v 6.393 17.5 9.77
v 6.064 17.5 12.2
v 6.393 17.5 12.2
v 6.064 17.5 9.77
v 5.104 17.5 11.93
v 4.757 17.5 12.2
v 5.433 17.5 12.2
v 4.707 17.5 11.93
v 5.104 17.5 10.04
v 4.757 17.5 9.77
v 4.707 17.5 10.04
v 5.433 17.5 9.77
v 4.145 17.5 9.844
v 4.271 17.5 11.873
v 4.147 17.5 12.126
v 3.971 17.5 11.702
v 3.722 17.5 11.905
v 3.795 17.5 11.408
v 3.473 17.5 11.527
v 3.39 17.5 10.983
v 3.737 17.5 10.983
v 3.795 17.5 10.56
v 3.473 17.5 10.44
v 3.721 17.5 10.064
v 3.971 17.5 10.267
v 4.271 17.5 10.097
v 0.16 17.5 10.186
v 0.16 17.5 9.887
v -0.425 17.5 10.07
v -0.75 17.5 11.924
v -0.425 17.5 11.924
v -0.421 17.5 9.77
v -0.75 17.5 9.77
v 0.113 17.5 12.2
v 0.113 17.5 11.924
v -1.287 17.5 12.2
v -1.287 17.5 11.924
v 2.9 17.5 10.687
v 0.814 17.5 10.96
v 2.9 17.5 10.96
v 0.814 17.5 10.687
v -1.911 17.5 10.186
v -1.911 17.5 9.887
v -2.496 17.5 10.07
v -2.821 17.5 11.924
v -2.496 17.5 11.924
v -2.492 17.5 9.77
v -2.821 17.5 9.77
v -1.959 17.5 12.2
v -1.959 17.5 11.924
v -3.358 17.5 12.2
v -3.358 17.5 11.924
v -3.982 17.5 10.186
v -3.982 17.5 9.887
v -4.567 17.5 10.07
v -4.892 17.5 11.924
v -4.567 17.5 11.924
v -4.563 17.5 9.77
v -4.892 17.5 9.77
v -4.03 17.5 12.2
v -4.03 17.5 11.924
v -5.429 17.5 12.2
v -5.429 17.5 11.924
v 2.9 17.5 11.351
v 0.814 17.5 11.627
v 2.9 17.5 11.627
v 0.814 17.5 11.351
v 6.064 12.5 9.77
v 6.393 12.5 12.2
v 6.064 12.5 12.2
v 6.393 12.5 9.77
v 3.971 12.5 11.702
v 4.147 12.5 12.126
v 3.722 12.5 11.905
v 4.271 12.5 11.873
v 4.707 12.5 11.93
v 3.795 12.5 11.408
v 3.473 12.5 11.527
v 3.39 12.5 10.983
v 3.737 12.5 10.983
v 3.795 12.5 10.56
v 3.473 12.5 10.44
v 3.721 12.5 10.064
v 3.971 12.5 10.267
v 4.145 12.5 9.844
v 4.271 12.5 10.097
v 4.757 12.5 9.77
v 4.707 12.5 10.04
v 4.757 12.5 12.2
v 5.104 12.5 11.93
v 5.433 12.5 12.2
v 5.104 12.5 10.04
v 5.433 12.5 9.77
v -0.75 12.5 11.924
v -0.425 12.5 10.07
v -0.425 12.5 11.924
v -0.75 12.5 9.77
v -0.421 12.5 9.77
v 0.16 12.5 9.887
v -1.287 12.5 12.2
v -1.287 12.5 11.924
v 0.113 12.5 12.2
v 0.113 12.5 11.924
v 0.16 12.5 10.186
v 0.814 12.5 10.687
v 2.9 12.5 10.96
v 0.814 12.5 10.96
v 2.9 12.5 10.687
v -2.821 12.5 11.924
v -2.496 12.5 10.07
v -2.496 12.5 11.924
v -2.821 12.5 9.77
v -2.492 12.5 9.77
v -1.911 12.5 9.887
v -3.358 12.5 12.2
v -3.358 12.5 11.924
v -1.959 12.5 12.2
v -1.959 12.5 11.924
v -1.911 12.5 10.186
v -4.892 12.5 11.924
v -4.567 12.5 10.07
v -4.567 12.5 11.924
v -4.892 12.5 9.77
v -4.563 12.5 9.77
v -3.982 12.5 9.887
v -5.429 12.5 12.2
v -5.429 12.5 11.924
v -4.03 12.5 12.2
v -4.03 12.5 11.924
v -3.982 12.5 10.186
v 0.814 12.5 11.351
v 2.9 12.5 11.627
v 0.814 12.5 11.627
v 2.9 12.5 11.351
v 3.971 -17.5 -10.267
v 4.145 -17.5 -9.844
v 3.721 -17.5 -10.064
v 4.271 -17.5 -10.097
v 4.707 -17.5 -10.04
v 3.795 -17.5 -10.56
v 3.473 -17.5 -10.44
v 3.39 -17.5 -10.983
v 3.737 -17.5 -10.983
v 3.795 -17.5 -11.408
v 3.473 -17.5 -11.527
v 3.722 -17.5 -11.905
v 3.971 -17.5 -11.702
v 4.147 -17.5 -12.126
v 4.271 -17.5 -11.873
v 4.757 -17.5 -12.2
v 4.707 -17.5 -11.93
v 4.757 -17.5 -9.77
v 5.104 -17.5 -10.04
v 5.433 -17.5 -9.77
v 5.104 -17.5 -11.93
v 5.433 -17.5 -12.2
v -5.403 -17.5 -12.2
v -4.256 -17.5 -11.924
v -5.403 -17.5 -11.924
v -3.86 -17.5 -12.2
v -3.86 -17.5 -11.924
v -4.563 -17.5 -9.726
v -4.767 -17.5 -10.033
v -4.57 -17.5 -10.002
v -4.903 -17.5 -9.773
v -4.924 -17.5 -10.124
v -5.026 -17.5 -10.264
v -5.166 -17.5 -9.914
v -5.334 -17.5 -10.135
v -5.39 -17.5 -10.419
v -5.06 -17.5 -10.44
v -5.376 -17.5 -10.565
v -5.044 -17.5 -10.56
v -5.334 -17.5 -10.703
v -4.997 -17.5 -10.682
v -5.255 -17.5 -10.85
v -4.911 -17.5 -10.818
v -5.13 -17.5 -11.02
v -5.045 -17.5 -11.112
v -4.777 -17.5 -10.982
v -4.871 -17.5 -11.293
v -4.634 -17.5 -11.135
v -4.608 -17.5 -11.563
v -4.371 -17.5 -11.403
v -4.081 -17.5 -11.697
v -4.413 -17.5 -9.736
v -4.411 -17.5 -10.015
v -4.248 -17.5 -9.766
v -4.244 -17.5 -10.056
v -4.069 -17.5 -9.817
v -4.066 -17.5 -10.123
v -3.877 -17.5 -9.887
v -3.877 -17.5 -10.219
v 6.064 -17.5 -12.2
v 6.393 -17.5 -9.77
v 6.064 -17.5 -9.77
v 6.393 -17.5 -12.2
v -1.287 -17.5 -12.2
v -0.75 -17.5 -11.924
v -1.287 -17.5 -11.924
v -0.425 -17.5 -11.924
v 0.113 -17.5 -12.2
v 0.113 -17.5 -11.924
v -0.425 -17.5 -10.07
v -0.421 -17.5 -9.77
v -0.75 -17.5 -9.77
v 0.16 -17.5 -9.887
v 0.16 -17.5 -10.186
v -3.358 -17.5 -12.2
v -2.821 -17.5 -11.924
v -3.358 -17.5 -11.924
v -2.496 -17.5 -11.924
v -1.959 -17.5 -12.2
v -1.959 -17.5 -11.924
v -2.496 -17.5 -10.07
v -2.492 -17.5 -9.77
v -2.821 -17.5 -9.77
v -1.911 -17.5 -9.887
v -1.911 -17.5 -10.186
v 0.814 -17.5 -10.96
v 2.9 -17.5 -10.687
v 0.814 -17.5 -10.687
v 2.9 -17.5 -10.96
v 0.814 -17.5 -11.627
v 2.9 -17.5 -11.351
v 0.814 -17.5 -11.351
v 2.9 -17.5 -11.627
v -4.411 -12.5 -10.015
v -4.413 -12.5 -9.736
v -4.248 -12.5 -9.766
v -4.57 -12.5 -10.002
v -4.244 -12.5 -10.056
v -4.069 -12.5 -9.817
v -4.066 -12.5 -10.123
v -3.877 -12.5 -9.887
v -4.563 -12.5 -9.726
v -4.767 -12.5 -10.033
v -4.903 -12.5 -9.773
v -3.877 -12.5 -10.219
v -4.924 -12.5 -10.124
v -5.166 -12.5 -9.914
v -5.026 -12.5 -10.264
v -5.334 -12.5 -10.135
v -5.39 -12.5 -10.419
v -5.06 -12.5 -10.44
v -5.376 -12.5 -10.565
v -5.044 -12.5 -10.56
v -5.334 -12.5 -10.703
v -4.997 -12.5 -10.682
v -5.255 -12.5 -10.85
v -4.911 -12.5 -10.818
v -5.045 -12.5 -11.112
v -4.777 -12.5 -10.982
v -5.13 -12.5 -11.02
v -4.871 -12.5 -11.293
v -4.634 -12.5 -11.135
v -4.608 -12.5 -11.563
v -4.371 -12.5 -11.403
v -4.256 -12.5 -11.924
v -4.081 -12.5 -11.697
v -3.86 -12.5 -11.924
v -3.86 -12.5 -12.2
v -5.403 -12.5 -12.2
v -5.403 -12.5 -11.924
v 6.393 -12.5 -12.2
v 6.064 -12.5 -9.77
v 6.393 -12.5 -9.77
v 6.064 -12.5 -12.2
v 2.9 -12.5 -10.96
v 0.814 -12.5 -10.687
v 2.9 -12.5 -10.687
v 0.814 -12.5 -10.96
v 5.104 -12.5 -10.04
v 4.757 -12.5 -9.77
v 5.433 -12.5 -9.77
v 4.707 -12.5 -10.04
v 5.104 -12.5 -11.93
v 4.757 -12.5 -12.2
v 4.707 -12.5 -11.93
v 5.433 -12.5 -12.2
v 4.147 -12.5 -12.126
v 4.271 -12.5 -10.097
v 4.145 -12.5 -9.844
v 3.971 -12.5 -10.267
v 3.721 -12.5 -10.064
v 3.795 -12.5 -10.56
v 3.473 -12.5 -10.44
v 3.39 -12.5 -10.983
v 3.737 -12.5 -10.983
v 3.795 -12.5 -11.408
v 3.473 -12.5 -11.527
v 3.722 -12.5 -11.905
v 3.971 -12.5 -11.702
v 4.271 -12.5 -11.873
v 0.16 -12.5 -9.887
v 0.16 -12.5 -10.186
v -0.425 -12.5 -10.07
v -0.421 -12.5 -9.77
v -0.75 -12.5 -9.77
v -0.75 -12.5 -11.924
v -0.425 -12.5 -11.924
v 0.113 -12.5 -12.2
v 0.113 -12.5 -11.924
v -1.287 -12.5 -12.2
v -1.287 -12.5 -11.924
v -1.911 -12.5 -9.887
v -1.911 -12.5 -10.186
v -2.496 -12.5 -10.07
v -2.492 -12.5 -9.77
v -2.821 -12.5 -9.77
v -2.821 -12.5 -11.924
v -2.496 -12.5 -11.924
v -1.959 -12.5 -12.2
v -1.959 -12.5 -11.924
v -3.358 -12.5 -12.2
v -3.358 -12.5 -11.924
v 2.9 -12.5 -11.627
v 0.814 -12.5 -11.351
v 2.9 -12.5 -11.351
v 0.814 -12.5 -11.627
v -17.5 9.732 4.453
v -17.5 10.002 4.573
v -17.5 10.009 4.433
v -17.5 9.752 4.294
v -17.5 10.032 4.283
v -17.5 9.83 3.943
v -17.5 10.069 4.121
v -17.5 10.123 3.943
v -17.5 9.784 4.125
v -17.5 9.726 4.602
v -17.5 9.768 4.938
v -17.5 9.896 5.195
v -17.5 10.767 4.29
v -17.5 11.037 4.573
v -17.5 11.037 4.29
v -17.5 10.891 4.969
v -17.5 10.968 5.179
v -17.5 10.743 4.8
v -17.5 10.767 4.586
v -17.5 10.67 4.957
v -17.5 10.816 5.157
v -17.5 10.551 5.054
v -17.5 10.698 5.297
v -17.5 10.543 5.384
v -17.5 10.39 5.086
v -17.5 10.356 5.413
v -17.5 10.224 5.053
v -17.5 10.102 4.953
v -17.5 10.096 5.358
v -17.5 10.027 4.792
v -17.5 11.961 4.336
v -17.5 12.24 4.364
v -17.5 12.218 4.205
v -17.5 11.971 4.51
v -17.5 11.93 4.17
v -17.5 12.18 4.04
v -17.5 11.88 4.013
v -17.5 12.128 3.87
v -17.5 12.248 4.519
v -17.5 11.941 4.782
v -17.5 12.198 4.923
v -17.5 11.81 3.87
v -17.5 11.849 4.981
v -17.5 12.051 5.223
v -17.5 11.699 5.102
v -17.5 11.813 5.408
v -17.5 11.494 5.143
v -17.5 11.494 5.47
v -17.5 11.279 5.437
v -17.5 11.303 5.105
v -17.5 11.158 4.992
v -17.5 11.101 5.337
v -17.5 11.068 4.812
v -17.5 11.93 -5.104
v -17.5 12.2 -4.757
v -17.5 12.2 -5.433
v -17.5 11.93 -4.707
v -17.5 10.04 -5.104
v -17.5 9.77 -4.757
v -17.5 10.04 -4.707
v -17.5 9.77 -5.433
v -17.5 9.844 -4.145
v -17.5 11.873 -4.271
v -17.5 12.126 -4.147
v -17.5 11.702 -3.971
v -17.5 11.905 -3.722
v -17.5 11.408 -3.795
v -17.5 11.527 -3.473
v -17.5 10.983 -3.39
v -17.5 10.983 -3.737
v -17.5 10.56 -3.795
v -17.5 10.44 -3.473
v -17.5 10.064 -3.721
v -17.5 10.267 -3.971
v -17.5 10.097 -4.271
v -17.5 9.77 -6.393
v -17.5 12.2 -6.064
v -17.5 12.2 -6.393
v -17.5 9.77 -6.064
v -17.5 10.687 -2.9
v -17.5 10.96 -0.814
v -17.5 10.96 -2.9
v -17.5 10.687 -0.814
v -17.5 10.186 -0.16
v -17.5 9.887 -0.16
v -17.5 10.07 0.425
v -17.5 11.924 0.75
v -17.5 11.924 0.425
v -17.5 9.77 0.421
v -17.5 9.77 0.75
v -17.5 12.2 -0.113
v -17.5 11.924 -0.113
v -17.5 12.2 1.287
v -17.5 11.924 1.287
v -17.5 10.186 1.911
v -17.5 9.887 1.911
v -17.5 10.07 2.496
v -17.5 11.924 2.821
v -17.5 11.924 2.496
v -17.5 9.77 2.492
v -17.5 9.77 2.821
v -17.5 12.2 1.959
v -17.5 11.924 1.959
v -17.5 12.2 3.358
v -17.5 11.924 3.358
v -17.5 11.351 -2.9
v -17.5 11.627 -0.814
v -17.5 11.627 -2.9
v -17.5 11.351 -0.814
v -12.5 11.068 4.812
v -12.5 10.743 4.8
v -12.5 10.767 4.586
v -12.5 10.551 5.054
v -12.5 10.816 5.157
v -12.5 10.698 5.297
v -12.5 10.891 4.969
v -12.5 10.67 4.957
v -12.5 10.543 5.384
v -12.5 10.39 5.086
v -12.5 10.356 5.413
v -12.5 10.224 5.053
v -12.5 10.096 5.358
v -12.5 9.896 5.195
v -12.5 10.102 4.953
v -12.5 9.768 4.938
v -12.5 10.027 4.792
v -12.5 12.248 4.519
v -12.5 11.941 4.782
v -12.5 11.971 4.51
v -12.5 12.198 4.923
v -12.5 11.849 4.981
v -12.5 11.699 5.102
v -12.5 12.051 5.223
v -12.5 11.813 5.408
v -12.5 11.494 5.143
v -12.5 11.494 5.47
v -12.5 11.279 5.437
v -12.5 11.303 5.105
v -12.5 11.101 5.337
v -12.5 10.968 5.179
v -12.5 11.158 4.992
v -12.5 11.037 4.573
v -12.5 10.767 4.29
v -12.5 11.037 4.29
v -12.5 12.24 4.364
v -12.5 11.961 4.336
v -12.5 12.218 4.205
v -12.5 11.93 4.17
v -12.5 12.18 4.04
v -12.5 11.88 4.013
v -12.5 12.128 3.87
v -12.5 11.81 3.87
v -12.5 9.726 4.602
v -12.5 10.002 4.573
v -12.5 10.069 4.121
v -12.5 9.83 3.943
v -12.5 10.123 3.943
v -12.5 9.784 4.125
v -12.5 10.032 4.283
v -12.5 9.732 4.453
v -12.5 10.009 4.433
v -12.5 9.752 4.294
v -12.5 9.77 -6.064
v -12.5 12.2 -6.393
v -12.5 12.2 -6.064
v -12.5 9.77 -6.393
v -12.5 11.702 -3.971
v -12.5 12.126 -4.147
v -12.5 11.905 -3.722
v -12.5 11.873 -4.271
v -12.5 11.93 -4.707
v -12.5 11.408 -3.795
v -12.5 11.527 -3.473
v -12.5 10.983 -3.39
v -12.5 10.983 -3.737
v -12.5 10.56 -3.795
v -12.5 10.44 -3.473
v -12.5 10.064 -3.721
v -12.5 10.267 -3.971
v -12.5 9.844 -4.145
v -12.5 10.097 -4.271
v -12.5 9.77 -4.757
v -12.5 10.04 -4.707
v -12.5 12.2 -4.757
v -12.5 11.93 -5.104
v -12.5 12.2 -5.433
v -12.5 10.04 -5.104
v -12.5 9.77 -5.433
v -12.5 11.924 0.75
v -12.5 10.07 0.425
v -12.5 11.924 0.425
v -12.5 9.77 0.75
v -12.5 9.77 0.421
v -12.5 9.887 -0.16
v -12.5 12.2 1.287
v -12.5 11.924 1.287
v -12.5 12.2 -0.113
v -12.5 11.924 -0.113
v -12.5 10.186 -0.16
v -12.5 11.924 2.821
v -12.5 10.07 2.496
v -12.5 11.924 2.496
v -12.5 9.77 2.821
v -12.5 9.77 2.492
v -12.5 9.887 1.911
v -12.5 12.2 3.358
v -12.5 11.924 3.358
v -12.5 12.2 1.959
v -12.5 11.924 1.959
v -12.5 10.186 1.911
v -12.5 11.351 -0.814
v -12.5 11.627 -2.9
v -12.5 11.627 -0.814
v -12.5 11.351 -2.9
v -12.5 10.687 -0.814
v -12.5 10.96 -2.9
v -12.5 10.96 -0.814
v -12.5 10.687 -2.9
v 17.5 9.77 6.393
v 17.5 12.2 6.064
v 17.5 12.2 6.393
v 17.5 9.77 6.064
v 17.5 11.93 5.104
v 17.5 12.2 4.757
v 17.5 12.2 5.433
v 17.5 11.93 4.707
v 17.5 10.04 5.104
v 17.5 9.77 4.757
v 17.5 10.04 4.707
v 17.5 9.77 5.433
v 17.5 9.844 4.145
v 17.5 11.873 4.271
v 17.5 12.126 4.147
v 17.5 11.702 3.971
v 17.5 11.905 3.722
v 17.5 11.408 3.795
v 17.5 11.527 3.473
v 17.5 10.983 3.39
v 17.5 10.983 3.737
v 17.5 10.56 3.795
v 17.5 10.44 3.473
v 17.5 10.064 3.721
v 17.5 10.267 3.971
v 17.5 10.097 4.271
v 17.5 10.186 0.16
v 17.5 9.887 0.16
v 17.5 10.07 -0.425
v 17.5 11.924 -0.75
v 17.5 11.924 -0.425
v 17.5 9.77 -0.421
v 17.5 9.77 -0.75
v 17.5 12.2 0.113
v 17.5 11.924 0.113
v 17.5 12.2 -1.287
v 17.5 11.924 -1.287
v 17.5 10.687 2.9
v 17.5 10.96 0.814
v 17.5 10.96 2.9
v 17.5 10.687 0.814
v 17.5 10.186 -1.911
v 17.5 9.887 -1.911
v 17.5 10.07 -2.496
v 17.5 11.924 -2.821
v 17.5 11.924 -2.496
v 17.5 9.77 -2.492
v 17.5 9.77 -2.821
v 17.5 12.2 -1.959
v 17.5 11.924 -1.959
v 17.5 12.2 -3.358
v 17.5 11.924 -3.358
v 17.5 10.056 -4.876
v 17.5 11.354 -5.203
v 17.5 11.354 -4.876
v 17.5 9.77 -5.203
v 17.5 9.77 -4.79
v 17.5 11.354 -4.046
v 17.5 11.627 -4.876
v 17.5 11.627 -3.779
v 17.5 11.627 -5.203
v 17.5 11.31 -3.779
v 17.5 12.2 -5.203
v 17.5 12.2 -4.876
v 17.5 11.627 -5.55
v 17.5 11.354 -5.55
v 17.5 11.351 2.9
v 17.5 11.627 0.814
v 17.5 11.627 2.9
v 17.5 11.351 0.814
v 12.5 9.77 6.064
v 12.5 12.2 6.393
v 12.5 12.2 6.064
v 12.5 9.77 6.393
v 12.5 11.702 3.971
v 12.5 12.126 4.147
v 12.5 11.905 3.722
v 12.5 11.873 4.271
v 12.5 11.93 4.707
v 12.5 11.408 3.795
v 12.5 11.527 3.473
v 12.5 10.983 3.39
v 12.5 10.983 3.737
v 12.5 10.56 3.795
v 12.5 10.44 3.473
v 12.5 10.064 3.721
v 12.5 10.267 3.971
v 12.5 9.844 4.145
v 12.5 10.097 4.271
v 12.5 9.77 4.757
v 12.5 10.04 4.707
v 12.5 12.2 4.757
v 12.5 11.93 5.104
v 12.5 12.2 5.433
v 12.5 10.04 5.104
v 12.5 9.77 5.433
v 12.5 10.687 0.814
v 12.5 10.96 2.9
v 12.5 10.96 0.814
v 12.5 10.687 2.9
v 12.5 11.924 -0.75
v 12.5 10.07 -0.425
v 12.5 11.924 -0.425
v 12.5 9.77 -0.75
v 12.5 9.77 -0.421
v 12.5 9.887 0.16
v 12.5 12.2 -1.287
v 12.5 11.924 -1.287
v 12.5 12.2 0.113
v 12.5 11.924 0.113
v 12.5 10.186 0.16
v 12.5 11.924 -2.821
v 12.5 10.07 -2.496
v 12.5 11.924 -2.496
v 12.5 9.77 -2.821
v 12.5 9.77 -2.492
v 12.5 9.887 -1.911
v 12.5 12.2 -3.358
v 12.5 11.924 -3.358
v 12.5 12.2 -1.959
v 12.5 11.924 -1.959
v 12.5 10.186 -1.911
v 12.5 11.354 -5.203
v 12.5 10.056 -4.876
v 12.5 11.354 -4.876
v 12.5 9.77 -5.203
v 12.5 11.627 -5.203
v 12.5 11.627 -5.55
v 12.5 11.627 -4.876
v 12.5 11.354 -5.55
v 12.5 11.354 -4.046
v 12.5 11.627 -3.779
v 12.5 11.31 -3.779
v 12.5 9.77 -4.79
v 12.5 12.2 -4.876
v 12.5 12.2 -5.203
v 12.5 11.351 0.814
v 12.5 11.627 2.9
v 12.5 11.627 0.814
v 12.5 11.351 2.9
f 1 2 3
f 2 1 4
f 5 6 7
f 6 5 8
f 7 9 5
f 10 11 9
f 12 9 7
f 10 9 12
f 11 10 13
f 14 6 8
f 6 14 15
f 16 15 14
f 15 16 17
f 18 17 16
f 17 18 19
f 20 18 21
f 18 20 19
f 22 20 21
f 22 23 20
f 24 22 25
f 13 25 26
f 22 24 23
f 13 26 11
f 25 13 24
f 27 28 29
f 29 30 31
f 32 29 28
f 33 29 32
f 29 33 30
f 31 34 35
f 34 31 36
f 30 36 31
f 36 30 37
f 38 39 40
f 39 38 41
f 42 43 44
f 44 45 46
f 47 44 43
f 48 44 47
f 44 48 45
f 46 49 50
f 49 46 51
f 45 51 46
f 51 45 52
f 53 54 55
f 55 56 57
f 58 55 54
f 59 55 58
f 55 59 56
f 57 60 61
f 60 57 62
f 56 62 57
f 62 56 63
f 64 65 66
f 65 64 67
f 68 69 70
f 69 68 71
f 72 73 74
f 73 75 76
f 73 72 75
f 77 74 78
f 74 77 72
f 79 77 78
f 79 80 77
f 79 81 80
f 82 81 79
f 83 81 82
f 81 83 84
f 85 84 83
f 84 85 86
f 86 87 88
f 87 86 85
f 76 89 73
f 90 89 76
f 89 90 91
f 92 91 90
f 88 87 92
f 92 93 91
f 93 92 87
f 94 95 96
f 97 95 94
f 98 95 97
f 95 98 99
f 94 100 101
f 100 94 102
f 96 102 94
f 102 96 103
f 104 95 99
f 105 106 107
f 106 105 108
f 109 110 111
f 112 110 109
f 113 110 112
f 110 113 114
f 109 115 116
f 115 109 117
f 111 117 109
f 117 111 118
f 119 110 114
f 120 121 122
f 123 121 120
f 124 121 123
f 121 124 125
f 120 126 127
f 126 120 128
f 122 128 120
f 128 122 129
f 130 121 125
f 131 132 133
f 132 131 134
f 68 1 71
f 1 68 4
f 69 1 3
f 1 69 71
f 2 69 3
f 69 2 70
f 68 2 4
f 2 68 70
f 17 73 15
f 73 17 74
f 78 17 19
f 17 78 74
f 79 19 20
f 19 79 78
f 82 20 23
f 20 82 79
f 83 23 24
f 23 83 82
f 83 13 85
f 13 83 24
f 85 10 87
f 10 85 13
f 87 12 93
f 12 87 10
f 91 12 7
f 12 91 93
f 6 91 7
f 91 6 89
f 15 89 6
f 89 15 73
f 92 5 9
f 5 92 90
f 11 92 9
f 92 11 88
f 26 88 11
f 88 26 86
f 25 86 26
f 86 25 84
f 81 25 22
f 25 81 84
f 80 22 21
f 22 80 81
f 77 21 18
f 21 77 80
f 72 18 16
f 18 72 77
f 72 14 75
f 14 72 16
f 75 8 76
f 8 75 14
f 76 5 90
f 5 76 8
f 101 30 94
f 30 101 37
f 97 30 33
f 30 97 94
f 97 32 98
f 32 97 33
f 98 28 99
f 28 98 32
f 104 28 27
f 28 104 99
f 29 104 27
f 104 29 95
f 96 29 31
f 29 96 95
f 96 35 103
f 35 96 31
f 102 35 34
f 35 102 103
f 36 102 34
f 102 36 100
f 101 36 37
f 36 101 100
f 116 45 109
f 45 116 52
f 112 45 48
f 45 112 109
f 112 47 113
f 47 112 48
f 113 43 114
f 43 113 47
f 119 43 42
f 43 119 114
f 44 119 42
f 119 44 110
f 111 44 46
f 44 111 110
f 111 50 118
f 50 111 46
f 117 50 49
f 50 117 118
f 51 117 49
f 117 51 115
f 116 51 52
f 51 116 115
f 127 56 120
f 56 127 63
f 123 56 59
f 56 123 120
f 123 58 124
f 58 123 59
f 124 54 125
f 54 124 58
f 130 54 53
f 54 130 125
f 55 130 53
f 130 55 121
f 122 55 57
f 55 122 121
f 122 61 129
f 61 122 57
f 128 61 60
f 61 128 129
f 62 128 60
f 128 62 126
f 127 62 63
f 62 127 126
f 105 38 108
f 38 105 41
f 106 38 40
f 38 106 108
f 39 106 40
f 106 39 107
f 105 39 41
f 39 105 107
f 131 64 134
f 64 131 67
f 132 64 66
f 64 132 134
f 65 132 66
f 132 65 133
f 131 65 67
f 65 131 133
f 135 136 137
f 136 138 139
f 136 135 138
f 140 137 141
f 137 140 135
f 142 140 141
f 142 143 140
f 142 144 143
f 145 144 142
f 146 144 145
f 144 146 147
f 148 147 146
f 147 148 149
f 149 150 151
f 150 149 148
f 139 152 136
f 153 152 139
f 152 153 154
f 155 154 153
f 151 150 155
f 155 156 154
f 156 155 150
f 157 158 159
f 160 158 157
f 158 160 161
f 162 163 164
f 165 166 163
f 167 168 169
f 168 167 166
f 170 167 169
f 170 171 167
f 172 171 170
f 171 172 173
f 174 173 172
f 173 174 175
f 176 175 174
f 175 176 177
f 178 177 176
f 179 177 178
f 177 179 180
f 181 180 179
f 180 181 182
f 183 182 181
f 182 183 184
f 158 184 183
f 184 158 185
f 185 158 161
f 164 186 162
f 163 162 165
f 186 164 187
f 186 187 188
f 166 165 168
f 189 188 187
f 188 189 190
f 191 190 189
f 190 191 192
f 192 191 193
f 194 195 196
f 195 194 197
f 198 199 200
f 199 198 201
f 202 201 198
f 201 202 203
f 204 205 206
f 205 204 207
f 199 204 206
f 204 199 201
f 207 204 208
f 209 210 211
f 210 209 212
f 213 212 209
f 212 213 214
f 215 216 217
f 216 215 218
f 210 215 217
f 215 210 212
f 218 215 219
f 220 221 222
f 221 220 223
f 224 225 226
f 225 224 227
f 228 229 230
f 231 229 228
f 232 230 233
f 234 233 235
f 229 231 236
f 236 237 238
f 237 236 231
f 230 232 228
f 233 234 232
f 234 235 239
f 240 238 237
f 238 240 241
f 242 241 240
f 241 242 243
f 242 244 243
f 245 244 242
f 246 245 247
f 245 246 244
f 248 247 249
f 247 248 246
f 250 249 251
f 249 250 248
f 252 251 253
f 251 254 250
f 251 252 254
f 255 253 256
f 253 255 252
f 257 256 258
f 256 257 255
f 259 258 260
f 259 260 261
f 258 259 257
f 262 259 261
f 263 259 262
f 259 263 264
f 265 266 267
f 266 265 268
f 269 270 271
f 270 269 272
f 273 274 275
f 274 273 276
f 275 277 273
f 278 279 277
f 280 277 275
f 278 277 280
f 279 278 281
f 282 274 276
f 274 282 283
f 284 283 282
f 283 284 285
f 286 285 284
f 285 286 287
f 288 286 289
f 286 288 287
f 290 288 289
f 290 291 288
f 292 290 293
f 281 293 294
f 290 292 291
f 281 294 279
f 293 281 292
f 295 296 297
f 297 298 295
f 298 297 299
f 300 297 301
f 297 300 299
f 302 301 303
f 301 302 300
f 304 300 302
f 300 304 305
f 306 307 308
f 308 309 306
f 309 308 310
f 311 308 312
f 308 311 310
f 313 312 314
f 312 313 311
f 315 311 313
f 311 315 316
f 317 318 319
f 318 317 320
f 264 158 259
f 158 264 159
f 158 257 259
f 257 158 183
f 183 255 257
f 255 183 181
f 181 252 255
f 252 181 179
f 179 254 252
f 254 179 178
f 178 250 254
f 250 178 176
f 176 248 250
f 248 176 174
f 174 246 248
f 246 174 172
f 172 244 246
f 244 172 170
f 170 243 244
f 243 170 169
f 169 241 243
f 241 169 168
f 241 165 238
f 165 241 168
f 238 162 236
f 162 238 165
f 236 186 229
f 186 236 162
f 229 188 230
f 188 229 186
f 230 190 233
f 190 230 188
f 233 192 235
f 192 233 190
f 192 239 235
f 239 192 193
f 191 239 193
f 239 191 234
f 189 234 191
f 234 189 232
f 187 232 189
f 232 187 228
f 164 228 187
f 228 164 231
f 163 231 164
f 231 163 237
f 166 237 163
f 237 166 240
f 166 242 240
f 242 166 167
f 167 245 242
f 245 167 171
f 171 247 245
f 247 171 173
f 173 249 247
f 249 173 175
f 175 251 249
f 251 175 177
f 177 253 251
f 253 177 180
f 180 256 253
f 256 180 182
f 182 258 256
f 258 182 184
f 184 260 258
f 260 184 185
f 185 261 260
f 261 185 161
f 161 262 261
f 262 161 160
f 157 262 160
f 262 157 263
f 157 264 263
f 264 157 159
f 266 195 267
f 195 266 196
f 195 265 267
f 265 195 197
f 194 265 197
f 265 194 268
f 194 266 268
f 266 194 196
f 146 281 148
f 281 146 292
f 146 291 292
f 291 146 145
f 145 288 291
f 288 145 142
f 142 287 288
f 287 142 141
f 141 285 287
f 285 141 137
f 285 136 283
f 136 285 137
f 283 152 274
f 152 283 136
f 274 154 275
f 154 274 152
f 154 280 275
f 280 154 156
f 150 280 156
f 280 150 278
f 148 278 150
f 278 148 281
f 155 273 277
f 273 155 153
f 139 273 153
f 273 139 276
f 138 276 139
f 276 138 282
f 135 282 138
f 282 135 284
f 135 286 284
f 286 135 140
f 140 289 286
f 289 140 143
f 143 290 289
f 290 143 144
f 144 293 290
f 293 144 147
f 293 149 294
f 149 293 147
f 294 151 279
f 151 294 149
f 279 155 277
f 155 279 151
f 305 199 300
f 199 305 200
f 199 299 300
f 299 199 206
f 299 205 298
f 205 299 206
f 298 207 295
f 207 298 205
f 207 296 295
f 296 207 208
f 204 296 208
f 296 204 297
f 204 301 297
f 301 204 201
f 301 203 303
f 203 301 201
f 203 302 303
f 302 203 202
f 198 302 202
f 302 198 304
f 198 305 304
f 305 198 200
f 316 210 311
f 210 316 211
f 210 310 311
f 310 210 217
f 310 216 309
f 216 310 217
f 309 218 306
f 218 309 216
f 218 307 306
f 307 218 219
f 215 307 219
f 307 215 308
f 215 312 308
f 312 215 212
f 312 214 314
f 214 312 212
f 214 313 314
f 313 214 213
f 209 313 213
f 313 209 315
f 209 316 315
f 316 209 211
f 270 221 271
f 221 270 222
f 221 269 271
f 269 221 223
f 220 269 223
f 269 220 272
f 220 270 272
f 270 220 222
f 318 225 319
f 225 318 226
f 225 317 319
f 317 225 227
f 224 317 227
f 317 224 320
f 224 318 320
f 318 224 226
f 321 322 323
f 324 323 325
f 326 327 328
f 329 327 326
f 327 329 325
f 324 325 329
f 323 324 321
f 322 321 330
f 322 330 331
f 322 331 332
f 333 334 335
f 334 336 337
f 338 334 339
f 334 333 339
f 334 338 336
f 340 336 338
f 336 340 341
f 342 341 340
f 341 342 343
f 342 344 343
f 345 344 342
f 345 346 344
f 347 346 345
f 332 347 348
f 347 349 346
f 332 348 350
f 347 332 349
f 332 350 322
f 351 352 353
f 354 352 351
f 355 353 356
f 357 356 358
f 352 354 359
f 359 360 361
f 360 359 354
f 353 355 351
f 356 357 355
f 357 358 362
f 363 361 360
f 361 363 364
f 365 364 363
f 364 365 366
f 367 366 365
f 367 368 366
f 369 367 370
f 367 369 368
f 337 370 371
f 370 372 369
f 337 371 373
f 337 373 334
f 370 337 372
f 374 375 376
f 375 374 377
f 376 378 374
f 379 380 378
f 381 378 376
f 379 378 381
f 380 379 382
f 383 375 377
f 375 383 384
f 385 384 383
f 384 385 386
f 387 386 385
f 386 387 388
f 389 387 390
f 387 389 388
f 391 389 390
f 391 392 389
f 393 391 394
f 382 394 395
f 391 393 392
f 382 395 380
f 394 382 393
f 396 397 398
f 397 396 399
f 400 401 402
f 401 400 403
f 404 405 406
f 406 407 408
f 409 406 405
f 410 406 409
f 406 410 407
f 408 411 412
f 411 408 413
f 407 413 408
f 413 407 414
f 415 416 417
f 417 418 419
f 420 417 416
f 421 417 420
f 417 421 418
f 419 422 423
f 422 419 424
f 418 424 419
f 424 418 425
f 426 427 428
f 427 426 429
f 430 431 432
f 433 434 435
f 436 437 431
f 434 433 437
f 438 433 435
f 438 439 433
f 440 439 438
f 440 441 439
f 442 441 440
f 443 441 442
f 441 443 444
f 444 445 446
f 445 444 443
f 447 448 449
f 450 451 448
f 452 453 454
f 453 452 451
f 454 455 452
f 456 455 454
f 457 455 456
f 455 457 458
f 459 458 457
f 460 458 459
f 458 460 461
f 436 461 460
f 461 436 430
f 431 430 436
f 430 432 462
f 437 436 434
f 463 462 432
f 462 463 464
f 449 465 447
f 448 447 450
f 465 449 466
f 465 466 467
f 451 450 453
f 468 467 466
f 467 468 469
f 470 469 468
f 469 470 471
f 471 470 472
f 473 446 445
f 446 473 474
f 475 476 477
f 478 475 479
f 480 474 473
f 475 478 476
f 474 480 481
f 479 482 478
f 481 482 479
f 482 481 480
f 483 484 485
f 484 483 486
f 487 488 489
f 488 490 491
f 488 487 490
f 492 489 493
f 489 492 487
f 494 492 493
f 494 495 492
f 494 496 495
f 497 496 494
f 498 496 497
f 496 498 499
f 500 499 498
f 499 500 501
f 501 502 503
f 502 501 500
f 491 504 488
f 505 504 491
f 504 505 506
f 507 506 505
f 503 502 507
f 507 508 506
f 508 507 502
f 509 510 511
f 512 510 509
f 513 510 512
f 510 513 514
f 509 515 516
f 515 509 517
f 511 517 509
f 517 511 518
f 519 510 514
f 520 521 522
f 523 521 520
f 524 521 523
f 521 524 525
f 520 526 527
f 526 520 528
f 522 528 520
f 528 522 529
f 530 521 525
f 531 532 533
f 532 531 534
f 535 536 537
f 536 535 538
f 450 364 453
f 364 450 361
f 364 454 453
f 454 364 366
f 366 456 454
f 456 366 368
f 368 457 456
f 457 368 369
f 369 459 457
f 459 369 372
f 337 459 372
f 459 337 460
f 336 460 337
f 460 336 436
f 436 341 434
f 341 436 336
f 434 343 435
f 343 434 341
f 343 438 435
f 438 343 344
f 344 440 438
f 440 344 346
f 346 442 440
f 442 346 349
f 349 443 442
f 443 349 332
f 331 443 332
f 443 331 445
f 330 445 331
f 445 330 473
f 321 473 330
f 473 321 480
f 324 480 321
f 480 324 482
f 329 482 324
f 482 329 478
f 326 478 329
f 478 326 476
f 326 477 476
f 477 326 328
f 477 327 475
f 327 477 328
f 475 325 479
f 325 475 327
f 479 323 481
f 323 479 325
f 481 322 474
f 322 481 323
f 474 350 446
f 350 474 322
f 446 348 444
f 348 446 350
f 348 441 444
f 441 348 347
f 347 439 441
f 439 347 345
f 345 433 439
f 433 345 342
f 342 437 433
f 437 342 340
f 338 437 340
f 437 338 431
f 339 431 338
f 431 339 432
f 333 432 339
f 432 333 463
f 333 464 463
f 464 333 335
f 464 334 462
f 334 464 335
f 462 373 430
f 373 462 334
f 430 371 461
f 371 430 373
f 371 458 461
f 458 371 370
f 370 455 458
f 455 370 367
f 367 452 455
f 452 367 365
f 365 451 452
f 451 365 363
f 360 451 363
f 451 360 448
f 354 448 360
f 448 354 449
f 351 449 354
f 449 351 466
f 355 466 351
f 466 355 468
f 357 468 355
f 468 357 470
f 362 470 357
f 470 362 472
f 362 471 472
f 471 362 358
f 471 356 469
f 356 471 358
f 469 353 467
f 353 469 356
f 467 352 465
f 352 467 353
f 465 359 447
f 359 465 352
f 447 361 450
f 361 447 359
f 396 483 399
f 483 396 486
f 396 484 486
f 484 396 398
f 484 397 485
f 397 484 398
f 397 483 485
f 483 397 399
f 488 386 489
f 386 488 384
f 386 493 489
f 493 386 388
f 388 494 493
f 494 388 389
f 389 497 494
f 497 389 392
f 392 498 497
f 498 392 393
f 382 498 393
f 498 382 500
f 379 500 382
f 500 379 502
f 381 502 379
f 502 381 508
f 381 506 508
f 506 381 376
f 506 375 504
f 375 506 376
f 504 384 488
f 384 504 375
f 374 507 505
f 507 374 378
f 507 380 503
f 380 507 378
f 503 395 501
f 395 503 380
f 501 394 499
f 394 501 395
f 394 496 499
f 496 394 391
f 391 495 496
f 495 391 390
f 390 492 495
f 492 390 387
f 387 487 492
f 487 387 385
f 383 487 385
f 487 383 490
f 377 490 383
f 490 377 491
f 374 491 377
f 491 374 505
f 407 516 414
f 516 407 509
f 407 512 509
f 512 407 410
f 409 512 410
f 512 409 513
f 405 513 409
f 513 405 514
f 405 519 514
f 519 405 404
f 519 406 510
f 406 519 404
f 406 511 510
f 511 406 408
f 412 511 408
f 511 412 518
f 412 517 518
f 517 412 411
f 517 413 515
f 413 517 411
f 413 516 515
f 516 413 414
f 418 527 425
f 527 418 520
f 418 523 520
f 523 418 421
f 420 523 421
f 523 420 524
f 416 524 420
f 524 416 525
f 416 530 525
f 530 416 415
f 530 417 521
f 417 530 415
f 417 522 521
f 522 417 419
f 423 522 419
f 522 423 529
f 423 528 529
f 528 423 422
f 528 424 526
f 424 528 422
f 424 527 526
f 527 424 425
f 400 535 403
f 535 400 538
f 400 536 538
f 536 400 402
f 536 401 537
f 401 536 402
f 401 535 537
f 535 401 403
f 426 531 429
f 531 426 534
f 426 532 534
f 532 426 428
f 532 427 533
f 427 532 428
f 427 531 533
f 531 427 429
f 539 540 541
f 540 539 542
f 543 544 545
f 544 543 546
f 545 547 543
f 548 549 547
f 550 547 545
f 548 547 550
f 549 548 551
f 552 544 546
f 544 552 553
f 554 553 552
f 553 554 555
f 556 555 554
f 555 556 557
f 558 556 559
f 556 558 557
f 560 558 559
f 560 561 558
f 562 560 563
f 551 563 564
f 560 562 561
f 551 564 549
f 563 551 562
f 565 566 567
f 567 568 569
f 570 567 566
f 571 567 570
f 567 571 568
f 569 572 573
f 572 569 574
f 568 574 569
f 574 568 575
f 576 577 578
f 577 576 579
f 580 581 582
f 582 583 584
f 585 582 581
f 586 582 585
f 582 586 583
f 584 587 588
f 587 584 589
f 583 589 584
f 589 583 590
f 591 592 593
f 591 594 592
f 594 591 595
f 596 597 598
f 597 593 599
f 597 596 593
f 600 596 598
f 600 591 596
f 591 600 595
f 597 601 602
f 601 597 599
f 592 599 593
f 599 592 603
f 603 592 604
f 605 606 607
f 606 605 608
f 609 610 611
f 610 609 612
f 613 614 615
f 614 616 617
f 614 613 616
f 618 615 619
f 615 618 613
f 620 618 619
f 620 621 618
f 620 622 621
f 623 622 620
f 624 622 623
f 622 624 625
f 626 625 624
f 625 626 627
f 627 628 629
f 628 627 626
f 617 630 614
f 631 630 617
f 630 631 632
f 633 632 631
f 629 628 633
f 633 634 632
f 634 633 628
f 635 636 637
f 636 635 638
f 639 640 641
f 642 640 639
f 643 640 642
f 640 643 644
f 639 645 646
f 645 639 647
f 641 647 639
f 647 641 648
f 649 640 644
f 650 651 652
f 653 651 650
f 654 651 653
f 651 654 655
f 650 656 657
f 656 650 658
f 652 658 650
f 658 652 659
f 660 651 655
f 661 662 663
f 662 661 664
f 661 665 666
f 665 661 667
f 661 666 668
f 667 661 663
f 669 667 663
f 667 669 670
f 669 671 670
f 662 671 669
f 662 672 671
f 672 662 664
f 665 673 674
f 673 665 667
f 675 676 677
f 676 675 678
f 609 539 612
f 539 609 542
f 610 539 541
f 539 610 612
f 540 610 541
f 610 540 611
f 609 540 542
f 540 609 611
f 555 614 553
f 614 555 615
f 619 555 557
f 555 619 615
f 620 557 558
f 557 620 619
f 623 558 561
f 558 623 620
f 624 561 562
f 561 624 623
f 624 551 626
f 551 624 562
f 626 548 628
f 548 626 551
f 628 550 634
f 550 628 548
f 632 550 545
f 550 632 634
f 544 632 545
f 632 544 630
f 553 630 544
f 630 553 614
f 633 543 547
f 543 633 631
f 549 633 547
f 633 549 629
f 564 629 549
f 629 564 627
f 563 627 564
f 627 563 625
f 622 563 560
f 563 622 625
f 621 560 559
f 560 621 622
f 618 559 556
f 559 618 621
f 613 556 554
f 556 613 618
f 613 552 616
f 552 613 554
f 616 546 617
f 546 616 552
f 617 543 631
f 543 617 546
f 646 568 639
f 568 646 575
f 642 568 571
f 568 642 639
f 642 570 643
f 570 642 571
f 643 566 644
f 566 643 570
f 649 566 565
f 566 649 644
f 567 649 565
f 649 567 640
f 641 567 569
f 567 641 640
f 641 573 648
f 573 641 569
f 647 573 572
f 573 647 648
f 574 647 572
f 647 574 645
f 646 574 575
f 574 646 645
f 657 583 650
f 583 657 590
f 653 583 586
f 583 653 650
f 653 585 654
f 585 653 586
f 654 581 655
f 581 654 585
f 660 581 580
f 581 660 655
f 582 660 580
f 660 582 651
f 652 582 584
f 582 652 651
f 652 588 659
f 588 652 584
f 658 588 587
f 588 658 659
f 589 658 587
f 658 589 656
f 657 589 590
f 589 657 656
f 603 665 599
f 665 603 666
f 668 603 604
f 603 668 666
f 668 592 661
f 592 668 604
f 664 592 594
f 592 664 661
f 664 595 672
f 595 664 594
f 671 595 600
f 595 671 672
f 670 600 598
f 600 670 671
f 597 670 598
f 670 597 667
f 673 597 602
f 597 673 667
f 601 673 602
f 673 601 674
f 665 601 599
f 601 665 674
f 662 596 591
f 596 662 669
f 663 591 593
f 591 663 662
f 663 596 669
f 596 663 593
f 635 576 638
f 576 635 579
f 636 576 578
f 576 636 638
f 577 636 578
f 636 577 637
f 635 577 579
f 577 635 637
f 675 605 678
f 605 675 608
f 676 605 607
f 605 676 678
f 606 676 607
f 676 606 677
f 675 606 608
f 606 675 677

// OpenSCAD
// file: modules.scad
zoom = [0.8,0.8,1];

module white( filename, text)
{
    scale(zoom)
    rotate([0,0,90]) 
    union(){ 
        translate([21.5,-8.4,-2.5])   rotate([0,0,90])  linear_extrude(5)  text (text,font="bold",size=3); 
        intersection() 
        {    
            cube([35,35,5],center=true); 
            translate([3,0,2.6])    scale([0.14,0.14,-1])  
            surface(file = filename, center = true); 
        } 
    } 

};

module black( filename, text)
{
    scale(zoom)
    rotate([0,0,90]) 
    difference() 
    {    
        translate([5,0,0])  cube([35,35,5],center=true); 
        translate([3,0,2.6])    scale([0.14,0.14,-1])  
        surface(file = filename, center = true);
        translate([21.5,-8.4,-2.5])   rotate([0,0,90])  linear_extrude(6)  text (text,font="bold",size=3);
    } 
}

module shape()
{
    scale(zoom)   rotate([0,0,90]) translate([5,0,0])  cube([35,35,5],center=true);  
}
// main file
include <modules.scad>

    union() color([0,1,0])
    {
        rotate([90,0,0])    translate([0,-5,-15])  white("../aruco/Marker111.png","ID=111");
        rotate([-90,0,0])    translate([0,-5,-15]) white("../aruco/Marker112.png","ID=112"); 
        rotate([00,90,0])    translate([0,-5,-15]) white("../aruco/Marker113.png","ID=113"); 
        rotate([00,-90,0])    translate([0,-5,-15])white("../aruco/Marker114.png","ID=114"); 
    }
